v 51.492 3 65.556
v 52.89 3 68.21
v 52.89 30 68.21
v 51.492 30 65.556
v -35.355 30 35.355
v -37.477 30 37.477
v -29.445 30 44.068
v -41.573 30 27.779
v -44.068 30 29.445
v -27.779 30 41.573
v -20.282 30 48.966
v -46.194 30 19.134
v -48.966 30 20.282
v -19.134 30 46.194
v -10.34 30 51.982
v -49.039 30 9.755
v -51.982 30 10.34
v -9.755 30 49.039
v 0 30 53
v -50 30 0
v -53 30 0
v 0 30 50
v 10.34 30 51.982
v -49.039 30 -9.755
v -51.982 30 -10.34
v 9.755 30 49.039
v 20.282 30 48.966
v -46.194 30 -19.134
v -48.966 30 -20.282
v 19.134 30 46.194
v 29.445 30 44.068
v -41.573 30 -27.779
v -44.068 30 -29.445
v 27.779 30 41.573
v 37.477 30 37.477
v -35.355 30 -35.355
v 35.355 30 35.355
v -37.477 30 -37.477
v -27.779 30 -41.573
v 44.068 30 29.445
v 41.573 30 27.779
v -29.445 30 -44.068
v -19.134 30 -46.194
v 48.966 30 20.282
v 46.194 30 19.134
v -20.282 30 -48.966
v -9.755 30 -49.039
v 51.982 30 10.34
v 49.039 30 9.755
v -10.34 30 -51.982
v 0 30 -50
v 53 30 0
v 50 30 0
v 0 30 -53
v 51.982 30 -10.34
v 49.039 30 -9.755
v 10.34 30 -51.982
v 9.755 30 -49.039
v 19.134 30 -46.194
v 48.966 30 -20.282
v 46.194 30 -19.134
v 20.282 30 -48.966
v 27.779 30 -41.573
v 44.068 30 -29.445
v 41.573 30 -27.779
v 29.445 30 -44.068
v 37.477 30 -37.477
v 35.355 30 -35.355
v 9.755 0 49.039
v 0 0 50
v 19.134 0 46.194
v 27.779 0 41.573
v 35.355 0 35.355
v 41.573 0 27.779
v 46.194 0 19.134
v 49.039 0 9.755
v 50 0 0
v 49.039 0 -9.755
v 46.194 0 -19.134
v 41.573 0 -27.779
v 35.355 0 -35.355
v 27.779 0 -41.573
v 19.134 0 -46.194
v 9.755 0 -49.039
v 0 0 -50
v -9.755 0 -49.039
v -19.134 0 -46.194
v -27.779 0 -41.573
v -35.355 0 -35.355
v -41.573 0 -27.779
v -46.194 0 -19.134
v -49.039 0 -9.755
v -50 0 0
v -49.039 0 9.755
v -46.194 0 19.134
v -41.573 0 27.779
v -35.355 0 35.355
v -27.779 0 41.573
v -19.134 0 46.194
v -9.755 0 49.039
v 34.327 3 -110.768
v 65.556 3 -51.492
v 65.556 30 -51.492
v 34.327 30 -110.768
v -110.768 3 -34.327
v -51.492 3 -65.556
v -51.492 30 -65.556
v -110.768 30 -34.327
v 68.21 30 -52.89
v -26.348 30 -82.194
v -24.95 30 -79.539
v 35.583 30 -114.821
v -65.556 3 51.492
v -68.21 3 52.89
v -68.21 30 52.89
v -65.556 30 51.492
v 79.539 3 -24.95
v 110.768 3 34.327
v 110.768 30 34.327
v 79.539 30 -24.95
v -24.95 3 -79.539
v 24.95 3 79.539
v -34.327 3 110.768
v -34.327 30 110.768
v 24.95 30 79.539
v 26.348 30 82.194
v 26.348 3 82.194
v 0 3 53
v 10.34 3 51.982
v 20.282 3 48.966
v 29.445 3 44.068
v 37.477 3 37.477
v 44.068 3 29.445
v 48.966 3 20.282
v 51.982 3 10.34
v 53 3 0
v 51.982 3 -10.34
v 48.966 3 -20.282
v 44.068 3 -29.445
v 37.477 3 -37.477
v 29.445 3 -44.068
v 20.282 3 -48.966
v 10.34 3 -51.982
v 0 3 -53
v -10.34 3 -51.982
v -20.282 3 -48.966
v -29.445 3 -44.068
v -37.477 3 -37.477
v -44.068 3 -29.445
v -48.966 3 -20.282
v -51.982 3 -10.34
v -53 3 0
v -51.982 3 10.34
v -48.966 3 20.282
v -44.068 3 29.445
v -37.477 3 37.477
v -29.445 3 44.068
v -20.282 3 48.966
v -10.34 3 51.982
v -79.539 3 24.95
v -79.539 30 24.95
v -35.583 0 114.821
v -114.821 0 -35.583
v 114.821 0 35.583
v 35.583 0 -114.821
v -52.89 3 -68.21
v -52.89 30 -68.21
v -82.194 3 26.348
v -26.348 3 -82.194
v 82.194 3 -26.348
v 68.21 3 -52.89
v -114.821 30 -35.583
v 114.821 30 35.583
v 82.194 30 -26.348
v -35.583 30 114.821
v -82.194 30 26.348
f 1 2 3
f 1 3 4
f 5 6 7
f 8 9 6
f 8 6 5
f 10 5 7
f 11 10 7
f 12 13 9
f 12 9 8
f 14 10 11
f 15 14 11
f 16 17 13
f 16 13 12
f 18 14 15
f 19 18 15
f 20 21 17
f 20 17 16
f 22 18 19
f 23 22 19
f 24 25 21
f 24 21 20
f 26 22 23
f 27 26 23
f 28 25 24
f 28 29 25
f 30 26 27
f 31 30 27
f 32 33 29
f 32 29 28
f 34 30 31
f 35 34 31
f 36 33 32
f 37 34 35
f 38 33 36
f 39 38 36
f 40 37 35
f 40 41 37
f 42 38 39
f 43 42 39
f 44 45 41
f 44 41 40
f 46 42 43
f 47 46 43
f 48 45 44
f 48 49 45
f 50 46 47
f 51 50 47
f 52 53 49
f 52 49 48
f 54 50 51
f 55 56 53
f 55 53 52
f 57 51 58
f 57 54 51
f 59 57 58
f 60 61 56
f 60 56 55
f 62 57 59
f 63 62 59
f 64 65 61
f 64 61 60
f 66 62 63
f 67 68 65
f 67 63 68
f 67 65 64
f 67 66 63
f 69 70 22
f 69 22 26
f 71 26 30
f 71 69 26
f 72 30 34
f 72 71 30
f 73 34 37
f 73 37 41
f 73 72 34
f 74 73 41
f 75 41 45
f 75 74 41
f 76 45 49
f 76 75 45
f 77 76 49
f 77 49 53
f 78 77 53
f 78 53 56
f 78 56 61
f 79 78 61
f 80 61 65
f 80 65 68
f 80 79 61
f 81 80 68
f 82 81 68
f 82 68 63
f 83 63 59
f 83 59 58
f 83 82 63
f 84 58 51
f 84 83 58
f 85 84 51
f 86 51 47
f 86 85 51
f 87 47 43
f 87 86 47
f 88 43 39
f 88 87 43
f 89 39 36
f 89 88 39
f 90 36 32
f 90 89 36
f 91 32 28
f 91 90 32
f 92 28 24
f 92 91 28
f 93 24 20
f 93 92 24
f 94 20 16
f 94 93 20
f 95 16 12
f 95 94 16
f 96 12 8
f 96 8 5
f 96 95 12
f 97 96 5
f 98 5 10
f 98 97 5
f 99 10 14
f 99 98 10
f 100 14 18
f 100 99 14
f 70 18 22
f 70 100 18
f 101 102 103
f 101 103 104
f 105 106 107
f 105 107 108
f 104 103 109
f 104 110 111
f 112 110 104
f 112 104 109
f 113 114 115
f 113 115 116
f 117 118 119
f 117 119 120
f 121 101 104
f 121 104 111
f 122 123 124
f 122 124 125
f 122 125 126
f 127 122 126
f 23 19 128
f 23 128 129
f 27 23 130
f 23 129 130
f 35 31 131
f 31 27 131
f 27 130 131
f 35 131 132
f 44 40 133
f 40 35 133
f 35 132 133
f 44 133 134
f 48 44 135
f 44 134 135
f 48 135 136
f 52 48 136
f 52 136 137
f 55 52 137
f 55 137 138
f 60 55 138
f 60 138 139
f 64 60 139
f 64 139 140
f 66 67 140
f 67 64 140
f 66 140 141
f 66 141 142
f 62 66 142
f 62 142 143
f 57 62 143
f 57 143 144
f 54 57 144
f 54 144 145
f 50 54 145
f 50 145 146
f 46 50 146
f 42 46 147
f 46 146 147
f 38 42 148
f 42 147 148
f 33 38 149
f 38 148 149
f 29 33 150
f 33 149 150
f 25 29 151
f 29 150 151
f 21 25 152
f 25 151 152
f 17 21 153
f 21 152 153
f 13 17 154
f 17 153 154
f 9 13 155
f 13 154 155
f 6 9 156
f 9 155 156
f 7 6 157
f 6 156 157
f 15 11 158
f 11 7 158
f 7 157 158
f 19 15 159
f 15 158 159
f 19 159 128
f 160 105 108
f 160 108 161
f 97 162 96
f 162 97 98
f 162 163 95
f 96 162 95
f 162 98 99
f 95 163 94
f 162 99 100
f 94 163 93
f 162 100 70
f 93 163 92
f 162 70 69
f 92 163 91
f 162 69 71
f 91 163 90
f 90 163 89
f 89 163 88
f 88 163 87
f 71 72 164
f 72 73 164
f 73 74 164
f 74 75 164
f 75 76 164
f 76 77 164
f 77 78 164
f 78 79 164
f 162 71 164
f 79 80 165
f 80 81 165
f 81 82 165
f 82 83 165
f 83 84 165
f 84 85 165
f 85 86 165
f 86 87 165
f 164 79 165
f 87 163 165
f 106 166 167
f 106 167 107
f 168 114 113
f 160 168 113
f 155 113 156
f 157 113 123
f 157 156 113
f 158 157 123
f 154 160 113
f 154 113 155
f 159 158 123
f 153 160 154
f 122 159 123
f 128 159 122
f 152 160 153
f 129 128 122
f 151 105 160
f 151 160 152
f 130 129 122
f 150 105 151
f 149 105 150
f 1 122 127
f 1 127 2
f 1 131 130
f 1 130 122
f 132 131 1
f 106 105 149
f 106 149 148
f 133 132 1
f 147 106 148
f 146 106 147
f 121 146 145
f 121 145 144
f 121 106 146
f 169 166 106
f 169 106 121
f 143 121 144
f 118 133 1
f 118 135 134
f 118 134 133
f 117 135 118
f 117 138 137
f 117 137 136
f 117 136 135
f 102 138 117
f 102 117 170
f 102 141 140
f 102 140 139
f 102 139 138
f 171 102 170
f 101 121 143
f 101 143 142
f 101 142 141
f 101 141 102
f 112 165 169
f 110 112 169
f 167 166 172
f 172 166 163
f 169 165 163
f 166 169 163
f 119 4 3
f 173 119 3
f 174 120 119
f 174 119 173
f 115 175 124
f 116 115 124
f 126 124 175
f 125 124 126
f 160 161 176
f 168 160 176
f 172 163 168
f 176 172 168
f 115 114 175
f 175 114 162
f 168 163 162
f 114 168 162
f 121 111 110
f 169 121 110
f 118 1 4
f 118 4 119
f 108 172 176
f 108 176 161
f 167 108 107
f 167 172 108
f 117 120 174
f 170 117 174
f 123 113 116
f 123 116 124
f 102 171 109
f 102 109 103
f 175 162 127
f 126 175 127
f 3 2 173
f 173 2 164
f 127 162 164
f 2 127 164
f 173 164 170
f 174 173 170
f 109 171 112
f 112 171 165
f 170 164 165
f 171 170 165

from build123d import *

# Parameters (mm, degrees)
SKETCH2_R           = 50
BOSS_EXTRUDE1_DEPTH = 30
SHELL1_T            = -3
CUT_EXTRUDE3_DEPTH  = 27


with BuildPart() as part:
    # Sketch2 → Boss-Extrude1 (new body)
    with BuildSketch(Plane(origin=(0, 0, 0), x_dir=(1, 0, 0), z_dir=(0, 1, 0))):
        Polygon((-35.583006561, -114.820946016), (114.820946016, -35.583006561), (35.583006561, 114.820946016), (-114.820946016, 35.583006561), align=None)
        with Locations(Location((0, 0, 0), (0, 0, 270))):
            Circle(SKETCH2_R, mode=Mode.SUBTRACT)
    extrude(amount=BOSS_EXTRUDE1_DEPTH)

    # Shell1
    shell1_openings = [part.faces().sort_by_distance(p)[0] for p in [
        (38.105232938, 30, 72.328706262),
    ]]
    offset(amount=SHELL1_T, openings=shell1_openings, kind=Kind.INTERSECTION)

    # Sketch7 → Cut-Extrude3 (cut)
    with BuildSketch(Plane(origin=(0, 30, 0), x_dir=(1, 0, 0), z_dir=(0, 1, 0))):
        Polygon((79.539371783, 24.949716157), (82.193559182, 26.348032736), (68.210393395, 52.88990672), (65.556205997, 51.491590141), align=None)
        Polygon((51.491590141, -65.556205997), (24.949716157, -79.539371783), (26.348032736, -82.193559182), (52.88990672, -68.210393395), align=None)
        Polygon((-65.556205997, -51.491590141), (-79.539371783, -24.949716157), (-82.193559182, -26.348032736), (-68.210393395, -52.88990672), align=None)
        Polygon((-51.491590141, 65.556205997), (-24.949716157, 79.539371783), (-26.348032736, 82.193559182), (-52.88990672, 68.210393395), align=None)
    extrude(amount=-CUT_EXTRUDE3_DEPTH, mode=Mode.SUBTRACT)


solid = part.part
